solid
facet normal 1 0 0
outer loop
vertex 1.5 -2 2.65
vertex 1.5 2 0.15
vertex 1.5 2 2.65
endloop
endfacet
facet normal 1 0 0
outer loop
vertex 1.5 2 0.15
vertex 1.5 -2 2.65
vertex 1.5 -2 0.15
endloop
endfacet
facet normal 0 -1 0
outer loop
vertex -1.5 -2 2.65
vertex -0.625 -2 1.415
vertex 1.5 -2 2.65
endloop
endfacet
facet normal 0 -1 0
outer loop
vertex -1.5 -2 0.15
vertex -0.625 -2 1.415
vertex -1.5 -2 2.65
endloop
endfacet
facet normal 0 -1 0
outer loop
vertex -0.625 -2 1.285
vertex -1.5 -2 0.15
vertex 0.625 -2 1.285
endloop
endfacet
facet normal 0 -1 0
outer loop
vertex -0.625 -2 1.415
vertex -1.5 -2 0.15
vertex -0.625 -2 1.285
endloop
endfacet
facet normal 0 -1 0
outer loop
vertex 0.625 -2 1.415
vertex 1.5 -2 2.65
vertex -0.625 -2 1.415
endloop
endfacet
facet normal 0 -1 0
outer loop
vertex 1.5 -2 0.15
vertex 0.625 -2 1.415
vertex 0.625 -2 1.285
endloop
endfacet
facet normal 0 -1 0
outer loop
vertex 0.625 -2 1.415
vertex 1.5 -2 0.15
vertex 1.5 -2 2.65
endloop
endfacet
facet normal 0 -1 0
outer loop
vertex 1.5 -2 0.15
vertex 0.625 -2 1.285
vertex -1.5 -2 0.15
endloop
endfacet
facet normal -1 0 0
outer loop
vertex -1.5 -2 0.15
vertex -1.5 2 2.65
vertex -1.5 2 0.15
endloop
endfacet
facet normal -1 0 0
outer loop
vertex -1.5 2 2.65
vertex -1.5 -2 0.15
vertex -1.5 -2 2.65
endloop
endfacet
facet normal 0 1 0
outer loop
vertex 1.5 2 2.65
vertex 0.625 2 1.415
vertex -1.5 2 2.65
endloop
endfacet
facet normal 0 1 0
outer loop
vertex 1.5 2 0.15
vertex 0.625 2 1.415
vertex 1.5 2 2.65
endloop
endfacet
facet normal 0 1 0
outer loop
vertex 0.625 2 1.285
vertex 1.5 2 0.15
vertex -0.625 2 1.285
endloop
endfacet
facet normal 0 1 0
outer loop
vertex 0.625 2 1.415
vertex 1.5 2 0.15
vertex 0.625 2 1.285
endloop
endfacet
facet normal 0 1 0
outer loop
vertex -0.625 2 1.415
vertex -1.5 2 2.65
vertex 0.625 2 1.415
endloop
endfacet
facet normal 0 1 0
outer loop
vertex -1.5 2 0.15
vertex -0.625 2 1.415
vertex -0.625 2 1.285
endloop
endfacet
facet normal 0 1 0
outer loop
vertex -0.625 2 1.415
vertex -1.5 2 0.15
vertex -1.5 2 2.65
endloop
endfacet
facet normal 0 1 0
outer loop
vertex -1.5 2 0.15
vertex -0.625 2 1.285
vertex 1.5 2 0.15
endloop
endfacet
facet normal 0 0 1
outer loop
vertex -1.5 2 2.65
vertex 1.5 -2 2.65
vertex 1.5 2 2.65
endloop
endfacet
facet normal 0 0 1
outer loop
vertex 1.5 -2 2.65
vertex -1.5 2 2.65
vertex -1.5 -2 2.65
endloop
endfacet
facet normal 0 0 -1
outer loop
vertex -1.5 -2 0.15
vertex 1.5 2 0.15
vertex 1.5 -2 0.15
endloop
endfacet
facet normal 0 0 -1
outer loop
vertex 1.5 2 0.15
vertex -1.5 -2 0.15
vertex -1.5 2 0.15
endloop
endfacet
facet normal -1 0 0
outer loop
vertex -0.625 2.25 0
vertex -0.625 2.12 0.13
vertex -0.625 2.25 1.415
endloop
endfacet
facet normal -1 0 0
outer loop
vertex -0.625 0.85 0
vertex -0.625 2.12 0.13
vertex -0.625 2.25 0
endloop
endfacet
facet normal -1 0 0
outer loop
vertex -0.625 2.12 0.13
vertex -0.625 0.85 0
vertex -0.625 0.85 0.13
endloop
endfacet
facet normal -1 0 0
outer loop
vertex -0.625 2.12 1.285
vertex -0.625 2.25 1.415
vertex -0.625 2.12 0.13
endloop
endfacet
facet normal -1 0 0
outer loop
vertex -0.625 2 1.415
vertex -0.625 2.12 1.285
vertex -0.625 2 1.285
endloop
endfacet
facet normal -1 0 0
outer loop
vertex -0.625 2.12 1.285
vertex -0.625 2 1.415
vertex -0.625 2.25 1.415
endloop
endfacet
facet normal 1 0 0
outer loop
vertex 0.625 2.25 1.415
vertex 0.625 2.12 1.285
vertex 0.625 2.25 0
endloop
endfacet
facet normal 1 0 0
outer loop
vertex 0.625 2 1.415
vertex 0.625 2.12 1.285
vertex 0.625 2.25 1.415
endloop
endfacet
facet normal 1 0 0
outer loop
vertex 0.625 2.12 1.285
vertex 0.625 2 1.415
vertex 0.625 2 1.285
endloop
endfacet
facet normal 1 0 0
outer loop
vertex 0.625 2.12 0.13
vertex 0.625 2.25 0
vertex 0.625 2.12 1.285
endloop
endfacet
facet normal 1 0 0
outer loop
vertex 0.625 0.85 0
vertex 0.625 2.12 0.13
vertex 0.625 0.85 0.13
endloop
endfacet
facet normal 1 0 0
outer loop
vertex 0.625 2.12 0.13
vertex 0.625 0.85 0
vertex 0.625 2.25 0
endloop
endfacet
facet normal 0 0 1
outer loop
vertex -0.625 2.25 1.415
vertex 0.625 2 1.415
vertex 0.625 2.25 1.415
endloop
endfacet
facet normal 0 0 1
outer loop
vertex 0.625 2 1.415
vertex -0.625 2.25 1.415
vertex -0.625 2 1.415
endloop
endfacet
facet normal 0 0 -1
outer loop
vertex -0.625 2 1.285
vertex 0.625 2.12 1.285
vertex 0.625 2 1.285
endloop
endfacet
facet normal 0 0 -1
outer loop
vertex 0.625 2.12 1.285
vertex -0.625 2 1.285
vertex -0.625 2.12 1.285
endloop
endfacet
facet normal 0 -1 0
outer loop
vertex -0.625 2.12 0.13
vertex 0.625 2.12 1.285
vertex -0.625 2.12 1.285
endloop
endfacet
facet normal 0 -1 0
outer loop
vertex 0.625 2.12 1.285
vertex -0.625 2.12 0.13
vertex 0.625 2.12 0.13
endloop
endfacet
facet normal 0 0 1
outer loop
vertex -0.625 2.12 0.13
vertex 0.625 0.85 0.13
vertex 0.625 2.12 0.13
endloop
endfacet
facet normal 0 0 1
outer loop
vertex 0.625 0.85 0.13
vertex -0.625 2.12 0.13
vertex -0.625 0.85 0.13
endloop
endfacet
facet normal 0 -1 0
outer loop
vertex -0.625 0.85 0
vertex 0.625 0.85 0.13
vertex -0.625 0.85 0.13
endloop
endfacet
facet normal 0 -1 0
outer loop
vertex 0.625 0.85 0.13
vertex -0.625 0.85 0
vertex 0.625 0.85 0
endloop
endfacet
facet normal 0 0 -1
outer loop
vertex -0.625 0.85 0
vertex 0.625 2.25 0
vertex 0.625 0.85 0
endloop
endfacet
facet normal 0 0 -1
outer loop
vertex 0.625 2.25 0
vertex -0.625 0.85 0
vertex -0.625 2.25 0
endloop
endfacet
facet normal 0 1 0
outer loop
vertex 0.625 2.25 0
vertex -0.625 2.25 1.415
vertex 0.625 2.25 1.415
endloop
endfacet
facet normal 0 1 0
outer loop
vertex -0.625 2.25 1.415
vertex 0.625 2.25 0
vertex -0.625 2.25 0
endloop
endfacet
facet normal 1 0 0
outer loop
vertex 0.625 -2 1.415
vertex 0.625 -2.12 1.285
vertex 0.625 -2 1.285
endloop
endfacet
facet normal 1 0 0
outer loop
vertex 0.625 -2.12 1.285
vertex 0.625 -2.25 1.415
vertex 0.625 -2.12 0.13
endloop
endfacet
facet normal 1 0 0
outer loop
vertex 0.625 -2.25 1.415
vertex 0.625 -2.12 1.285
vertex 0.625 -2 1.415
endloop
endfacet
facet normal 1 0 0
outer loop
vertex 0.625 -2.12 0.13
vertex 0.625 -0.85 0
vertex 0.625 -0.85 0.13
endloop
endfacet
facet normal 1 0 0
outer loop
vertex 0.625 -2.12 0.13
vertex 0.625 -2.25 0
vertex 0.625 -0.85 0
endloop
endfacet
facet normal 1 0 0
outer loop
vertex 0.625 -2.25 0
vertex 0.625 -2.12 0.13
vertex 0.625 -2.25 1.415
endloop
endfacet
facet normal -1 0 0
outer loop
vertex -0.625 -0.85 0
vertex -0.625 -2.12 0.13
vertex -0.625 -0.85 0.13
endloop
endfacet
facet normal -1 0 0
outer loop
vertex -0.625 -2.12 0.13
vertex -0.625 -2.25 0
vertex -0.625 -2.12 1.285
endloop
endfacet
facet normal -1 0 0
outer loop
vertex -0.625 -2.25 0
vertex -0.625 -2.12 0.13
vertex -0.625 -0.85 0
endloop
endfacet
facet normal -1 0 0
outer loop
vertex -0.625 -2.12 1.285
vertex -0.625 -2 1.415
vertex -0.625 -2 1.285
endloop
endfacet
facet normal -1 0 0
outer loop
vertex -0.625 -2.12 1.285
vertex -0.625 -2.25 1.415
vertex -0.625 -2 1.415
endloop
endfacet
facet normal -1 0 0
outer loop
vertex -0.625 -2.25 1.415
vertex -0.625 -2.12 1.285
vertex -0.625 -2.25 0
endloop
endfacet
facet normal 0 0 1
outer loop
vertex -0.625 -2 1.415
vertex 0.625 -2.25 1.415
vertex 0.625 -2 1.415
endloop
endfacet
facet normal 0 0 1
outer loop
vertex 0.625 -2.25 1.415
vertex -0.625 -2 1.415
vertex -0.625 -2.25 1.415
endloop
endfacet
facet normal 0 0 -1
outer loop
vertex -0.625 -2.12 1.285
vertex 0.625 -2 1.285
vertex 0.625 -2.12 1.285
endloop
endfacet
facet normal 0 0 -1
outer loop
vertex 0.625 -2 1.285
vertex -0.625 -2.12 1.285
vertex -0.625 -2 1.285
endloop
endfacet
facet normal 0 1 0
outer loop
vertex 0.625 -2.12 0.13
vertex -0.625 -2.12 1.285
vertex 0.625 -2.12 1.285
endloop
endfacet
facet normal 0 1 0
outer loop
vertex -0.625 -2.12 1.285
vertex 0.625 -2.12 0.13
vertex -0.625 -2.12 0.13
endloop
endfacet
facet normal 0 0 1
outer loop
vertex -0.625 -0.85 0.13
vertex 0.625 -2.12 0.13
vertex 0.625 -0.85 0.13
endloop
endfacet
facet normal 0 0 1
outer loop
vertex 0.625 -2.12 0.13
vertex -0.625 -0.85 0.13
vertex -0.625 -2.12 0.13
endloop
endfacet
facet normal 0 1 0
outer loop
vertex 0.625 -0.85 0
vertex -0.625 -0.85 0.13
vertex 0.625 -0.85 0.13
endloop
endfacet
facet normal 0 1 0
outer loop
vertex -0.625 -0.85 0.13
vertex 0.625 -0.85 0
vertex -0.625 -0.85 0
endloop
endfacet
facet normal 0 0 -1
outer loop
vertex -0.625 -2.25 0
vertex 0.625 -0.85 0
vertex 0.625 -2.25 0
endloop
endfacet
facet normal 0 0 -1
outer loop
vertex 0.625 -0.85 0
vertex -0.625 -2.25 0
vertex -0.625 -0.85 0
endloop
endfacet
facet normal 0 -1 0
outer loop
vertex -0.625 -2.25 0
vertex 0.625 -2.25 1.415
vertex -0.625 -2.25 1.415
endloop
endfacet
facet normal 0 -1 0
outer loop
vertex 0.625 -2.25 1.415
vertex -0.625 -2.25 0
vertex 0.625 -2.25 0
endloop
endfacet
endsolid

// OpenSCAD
pins = 2;
pin_pitch = 5.08;
pin_width = 1.25;
pin_seating = 1.4;
leadframe_thickness = 0.13;

overall_width = 4.5;
body_width = 4;
body_length = 3;
body_thickness_lower = 1.2;
body_thickness_upper = 1.3;

total_thickness = 2.65;

body_length_bevel = 0;
body_width_bevel = 0;
body_chamfer = 0;


leadframe_height = total_thickness - body_thickness_upper;


body();


translate([pin_pitch * ((pins / 2) - 1) / -2, overall_width / 2, 0]) for(n = [0 : pins / 2 - 1]) {
    translate([pin_pitch * n, 0, 0]) pin();
}
rotate([0, 0, 180]) translate([pin_pitch * ((pins / 2) - 1) / -2, overall_width / 2, 0]) for(n = [0 : pins / 2 - 1]) {
    translate([pin_pitch * n, 0, 0]) pin();
}


module pin() {
    color("#999") rotate([90, 0, 90]) linear_extrude(height = pin_width, center = true) {
        pin_length = (overall_width - body_width) / 2;
        polygon([
            [-pin_seating, 0],
            [0, 0],
            [0,           leadframe_height + leadframe_thickness/2],
            [-pin_length, leadframe_height + leadframe_thickness/2],
            [-pin_length, leadframe_height - leadframe_thickness/2],
            [-leadframe_thickness, leadframe_height - leadframe_thickness/2],
            [-leadframe_thickness, leadframe_thickness],
            [-pin_seating, leadframe_thickness],
        ]);
    }
}


module body() {
    color("#555") translate([0, 0, leadframe_height]) {
        linear_extrude(height = leadframe_thickness, center = true) body_outline();
        linear_extrude(
            height = body_thickness_upper,
            scale = [(body_length - body_length_bevel) / body_length, (body_width - body_width_bevel) / body_width]
        ) body_outline();
        
        rotate([180, 0, 0]) linear_extrude(
            height = body_thickness_lower,
            scale = [(body_length - body_length_bevel) / body_length, (body_width - body_width_bevel) / body_width]
        ) body_outline();
    }
}
module body_outline() {
    polygon([
        [ -body_length/2 + body_chamfer, -body_width/2 ],
        [ -body_length/2               , -body_width/2 + body_chamfer ],
        [ -body_length/2               , +body_width/2 - body_chamfer ],
        [ -body_length/2 + body_chamfer, +body_width/2 ],
        [ +body_length/2 - body_chamfer, +body_width/2 ],
        [ +body_length/2               , +body_width/2 - body_chamfer ],
        [ +body_length/2               , -body_width/2 + body_chamfer ],
        [ +body_length/2 - body_chamfer, -body_width/2 ],
    ]);
}
